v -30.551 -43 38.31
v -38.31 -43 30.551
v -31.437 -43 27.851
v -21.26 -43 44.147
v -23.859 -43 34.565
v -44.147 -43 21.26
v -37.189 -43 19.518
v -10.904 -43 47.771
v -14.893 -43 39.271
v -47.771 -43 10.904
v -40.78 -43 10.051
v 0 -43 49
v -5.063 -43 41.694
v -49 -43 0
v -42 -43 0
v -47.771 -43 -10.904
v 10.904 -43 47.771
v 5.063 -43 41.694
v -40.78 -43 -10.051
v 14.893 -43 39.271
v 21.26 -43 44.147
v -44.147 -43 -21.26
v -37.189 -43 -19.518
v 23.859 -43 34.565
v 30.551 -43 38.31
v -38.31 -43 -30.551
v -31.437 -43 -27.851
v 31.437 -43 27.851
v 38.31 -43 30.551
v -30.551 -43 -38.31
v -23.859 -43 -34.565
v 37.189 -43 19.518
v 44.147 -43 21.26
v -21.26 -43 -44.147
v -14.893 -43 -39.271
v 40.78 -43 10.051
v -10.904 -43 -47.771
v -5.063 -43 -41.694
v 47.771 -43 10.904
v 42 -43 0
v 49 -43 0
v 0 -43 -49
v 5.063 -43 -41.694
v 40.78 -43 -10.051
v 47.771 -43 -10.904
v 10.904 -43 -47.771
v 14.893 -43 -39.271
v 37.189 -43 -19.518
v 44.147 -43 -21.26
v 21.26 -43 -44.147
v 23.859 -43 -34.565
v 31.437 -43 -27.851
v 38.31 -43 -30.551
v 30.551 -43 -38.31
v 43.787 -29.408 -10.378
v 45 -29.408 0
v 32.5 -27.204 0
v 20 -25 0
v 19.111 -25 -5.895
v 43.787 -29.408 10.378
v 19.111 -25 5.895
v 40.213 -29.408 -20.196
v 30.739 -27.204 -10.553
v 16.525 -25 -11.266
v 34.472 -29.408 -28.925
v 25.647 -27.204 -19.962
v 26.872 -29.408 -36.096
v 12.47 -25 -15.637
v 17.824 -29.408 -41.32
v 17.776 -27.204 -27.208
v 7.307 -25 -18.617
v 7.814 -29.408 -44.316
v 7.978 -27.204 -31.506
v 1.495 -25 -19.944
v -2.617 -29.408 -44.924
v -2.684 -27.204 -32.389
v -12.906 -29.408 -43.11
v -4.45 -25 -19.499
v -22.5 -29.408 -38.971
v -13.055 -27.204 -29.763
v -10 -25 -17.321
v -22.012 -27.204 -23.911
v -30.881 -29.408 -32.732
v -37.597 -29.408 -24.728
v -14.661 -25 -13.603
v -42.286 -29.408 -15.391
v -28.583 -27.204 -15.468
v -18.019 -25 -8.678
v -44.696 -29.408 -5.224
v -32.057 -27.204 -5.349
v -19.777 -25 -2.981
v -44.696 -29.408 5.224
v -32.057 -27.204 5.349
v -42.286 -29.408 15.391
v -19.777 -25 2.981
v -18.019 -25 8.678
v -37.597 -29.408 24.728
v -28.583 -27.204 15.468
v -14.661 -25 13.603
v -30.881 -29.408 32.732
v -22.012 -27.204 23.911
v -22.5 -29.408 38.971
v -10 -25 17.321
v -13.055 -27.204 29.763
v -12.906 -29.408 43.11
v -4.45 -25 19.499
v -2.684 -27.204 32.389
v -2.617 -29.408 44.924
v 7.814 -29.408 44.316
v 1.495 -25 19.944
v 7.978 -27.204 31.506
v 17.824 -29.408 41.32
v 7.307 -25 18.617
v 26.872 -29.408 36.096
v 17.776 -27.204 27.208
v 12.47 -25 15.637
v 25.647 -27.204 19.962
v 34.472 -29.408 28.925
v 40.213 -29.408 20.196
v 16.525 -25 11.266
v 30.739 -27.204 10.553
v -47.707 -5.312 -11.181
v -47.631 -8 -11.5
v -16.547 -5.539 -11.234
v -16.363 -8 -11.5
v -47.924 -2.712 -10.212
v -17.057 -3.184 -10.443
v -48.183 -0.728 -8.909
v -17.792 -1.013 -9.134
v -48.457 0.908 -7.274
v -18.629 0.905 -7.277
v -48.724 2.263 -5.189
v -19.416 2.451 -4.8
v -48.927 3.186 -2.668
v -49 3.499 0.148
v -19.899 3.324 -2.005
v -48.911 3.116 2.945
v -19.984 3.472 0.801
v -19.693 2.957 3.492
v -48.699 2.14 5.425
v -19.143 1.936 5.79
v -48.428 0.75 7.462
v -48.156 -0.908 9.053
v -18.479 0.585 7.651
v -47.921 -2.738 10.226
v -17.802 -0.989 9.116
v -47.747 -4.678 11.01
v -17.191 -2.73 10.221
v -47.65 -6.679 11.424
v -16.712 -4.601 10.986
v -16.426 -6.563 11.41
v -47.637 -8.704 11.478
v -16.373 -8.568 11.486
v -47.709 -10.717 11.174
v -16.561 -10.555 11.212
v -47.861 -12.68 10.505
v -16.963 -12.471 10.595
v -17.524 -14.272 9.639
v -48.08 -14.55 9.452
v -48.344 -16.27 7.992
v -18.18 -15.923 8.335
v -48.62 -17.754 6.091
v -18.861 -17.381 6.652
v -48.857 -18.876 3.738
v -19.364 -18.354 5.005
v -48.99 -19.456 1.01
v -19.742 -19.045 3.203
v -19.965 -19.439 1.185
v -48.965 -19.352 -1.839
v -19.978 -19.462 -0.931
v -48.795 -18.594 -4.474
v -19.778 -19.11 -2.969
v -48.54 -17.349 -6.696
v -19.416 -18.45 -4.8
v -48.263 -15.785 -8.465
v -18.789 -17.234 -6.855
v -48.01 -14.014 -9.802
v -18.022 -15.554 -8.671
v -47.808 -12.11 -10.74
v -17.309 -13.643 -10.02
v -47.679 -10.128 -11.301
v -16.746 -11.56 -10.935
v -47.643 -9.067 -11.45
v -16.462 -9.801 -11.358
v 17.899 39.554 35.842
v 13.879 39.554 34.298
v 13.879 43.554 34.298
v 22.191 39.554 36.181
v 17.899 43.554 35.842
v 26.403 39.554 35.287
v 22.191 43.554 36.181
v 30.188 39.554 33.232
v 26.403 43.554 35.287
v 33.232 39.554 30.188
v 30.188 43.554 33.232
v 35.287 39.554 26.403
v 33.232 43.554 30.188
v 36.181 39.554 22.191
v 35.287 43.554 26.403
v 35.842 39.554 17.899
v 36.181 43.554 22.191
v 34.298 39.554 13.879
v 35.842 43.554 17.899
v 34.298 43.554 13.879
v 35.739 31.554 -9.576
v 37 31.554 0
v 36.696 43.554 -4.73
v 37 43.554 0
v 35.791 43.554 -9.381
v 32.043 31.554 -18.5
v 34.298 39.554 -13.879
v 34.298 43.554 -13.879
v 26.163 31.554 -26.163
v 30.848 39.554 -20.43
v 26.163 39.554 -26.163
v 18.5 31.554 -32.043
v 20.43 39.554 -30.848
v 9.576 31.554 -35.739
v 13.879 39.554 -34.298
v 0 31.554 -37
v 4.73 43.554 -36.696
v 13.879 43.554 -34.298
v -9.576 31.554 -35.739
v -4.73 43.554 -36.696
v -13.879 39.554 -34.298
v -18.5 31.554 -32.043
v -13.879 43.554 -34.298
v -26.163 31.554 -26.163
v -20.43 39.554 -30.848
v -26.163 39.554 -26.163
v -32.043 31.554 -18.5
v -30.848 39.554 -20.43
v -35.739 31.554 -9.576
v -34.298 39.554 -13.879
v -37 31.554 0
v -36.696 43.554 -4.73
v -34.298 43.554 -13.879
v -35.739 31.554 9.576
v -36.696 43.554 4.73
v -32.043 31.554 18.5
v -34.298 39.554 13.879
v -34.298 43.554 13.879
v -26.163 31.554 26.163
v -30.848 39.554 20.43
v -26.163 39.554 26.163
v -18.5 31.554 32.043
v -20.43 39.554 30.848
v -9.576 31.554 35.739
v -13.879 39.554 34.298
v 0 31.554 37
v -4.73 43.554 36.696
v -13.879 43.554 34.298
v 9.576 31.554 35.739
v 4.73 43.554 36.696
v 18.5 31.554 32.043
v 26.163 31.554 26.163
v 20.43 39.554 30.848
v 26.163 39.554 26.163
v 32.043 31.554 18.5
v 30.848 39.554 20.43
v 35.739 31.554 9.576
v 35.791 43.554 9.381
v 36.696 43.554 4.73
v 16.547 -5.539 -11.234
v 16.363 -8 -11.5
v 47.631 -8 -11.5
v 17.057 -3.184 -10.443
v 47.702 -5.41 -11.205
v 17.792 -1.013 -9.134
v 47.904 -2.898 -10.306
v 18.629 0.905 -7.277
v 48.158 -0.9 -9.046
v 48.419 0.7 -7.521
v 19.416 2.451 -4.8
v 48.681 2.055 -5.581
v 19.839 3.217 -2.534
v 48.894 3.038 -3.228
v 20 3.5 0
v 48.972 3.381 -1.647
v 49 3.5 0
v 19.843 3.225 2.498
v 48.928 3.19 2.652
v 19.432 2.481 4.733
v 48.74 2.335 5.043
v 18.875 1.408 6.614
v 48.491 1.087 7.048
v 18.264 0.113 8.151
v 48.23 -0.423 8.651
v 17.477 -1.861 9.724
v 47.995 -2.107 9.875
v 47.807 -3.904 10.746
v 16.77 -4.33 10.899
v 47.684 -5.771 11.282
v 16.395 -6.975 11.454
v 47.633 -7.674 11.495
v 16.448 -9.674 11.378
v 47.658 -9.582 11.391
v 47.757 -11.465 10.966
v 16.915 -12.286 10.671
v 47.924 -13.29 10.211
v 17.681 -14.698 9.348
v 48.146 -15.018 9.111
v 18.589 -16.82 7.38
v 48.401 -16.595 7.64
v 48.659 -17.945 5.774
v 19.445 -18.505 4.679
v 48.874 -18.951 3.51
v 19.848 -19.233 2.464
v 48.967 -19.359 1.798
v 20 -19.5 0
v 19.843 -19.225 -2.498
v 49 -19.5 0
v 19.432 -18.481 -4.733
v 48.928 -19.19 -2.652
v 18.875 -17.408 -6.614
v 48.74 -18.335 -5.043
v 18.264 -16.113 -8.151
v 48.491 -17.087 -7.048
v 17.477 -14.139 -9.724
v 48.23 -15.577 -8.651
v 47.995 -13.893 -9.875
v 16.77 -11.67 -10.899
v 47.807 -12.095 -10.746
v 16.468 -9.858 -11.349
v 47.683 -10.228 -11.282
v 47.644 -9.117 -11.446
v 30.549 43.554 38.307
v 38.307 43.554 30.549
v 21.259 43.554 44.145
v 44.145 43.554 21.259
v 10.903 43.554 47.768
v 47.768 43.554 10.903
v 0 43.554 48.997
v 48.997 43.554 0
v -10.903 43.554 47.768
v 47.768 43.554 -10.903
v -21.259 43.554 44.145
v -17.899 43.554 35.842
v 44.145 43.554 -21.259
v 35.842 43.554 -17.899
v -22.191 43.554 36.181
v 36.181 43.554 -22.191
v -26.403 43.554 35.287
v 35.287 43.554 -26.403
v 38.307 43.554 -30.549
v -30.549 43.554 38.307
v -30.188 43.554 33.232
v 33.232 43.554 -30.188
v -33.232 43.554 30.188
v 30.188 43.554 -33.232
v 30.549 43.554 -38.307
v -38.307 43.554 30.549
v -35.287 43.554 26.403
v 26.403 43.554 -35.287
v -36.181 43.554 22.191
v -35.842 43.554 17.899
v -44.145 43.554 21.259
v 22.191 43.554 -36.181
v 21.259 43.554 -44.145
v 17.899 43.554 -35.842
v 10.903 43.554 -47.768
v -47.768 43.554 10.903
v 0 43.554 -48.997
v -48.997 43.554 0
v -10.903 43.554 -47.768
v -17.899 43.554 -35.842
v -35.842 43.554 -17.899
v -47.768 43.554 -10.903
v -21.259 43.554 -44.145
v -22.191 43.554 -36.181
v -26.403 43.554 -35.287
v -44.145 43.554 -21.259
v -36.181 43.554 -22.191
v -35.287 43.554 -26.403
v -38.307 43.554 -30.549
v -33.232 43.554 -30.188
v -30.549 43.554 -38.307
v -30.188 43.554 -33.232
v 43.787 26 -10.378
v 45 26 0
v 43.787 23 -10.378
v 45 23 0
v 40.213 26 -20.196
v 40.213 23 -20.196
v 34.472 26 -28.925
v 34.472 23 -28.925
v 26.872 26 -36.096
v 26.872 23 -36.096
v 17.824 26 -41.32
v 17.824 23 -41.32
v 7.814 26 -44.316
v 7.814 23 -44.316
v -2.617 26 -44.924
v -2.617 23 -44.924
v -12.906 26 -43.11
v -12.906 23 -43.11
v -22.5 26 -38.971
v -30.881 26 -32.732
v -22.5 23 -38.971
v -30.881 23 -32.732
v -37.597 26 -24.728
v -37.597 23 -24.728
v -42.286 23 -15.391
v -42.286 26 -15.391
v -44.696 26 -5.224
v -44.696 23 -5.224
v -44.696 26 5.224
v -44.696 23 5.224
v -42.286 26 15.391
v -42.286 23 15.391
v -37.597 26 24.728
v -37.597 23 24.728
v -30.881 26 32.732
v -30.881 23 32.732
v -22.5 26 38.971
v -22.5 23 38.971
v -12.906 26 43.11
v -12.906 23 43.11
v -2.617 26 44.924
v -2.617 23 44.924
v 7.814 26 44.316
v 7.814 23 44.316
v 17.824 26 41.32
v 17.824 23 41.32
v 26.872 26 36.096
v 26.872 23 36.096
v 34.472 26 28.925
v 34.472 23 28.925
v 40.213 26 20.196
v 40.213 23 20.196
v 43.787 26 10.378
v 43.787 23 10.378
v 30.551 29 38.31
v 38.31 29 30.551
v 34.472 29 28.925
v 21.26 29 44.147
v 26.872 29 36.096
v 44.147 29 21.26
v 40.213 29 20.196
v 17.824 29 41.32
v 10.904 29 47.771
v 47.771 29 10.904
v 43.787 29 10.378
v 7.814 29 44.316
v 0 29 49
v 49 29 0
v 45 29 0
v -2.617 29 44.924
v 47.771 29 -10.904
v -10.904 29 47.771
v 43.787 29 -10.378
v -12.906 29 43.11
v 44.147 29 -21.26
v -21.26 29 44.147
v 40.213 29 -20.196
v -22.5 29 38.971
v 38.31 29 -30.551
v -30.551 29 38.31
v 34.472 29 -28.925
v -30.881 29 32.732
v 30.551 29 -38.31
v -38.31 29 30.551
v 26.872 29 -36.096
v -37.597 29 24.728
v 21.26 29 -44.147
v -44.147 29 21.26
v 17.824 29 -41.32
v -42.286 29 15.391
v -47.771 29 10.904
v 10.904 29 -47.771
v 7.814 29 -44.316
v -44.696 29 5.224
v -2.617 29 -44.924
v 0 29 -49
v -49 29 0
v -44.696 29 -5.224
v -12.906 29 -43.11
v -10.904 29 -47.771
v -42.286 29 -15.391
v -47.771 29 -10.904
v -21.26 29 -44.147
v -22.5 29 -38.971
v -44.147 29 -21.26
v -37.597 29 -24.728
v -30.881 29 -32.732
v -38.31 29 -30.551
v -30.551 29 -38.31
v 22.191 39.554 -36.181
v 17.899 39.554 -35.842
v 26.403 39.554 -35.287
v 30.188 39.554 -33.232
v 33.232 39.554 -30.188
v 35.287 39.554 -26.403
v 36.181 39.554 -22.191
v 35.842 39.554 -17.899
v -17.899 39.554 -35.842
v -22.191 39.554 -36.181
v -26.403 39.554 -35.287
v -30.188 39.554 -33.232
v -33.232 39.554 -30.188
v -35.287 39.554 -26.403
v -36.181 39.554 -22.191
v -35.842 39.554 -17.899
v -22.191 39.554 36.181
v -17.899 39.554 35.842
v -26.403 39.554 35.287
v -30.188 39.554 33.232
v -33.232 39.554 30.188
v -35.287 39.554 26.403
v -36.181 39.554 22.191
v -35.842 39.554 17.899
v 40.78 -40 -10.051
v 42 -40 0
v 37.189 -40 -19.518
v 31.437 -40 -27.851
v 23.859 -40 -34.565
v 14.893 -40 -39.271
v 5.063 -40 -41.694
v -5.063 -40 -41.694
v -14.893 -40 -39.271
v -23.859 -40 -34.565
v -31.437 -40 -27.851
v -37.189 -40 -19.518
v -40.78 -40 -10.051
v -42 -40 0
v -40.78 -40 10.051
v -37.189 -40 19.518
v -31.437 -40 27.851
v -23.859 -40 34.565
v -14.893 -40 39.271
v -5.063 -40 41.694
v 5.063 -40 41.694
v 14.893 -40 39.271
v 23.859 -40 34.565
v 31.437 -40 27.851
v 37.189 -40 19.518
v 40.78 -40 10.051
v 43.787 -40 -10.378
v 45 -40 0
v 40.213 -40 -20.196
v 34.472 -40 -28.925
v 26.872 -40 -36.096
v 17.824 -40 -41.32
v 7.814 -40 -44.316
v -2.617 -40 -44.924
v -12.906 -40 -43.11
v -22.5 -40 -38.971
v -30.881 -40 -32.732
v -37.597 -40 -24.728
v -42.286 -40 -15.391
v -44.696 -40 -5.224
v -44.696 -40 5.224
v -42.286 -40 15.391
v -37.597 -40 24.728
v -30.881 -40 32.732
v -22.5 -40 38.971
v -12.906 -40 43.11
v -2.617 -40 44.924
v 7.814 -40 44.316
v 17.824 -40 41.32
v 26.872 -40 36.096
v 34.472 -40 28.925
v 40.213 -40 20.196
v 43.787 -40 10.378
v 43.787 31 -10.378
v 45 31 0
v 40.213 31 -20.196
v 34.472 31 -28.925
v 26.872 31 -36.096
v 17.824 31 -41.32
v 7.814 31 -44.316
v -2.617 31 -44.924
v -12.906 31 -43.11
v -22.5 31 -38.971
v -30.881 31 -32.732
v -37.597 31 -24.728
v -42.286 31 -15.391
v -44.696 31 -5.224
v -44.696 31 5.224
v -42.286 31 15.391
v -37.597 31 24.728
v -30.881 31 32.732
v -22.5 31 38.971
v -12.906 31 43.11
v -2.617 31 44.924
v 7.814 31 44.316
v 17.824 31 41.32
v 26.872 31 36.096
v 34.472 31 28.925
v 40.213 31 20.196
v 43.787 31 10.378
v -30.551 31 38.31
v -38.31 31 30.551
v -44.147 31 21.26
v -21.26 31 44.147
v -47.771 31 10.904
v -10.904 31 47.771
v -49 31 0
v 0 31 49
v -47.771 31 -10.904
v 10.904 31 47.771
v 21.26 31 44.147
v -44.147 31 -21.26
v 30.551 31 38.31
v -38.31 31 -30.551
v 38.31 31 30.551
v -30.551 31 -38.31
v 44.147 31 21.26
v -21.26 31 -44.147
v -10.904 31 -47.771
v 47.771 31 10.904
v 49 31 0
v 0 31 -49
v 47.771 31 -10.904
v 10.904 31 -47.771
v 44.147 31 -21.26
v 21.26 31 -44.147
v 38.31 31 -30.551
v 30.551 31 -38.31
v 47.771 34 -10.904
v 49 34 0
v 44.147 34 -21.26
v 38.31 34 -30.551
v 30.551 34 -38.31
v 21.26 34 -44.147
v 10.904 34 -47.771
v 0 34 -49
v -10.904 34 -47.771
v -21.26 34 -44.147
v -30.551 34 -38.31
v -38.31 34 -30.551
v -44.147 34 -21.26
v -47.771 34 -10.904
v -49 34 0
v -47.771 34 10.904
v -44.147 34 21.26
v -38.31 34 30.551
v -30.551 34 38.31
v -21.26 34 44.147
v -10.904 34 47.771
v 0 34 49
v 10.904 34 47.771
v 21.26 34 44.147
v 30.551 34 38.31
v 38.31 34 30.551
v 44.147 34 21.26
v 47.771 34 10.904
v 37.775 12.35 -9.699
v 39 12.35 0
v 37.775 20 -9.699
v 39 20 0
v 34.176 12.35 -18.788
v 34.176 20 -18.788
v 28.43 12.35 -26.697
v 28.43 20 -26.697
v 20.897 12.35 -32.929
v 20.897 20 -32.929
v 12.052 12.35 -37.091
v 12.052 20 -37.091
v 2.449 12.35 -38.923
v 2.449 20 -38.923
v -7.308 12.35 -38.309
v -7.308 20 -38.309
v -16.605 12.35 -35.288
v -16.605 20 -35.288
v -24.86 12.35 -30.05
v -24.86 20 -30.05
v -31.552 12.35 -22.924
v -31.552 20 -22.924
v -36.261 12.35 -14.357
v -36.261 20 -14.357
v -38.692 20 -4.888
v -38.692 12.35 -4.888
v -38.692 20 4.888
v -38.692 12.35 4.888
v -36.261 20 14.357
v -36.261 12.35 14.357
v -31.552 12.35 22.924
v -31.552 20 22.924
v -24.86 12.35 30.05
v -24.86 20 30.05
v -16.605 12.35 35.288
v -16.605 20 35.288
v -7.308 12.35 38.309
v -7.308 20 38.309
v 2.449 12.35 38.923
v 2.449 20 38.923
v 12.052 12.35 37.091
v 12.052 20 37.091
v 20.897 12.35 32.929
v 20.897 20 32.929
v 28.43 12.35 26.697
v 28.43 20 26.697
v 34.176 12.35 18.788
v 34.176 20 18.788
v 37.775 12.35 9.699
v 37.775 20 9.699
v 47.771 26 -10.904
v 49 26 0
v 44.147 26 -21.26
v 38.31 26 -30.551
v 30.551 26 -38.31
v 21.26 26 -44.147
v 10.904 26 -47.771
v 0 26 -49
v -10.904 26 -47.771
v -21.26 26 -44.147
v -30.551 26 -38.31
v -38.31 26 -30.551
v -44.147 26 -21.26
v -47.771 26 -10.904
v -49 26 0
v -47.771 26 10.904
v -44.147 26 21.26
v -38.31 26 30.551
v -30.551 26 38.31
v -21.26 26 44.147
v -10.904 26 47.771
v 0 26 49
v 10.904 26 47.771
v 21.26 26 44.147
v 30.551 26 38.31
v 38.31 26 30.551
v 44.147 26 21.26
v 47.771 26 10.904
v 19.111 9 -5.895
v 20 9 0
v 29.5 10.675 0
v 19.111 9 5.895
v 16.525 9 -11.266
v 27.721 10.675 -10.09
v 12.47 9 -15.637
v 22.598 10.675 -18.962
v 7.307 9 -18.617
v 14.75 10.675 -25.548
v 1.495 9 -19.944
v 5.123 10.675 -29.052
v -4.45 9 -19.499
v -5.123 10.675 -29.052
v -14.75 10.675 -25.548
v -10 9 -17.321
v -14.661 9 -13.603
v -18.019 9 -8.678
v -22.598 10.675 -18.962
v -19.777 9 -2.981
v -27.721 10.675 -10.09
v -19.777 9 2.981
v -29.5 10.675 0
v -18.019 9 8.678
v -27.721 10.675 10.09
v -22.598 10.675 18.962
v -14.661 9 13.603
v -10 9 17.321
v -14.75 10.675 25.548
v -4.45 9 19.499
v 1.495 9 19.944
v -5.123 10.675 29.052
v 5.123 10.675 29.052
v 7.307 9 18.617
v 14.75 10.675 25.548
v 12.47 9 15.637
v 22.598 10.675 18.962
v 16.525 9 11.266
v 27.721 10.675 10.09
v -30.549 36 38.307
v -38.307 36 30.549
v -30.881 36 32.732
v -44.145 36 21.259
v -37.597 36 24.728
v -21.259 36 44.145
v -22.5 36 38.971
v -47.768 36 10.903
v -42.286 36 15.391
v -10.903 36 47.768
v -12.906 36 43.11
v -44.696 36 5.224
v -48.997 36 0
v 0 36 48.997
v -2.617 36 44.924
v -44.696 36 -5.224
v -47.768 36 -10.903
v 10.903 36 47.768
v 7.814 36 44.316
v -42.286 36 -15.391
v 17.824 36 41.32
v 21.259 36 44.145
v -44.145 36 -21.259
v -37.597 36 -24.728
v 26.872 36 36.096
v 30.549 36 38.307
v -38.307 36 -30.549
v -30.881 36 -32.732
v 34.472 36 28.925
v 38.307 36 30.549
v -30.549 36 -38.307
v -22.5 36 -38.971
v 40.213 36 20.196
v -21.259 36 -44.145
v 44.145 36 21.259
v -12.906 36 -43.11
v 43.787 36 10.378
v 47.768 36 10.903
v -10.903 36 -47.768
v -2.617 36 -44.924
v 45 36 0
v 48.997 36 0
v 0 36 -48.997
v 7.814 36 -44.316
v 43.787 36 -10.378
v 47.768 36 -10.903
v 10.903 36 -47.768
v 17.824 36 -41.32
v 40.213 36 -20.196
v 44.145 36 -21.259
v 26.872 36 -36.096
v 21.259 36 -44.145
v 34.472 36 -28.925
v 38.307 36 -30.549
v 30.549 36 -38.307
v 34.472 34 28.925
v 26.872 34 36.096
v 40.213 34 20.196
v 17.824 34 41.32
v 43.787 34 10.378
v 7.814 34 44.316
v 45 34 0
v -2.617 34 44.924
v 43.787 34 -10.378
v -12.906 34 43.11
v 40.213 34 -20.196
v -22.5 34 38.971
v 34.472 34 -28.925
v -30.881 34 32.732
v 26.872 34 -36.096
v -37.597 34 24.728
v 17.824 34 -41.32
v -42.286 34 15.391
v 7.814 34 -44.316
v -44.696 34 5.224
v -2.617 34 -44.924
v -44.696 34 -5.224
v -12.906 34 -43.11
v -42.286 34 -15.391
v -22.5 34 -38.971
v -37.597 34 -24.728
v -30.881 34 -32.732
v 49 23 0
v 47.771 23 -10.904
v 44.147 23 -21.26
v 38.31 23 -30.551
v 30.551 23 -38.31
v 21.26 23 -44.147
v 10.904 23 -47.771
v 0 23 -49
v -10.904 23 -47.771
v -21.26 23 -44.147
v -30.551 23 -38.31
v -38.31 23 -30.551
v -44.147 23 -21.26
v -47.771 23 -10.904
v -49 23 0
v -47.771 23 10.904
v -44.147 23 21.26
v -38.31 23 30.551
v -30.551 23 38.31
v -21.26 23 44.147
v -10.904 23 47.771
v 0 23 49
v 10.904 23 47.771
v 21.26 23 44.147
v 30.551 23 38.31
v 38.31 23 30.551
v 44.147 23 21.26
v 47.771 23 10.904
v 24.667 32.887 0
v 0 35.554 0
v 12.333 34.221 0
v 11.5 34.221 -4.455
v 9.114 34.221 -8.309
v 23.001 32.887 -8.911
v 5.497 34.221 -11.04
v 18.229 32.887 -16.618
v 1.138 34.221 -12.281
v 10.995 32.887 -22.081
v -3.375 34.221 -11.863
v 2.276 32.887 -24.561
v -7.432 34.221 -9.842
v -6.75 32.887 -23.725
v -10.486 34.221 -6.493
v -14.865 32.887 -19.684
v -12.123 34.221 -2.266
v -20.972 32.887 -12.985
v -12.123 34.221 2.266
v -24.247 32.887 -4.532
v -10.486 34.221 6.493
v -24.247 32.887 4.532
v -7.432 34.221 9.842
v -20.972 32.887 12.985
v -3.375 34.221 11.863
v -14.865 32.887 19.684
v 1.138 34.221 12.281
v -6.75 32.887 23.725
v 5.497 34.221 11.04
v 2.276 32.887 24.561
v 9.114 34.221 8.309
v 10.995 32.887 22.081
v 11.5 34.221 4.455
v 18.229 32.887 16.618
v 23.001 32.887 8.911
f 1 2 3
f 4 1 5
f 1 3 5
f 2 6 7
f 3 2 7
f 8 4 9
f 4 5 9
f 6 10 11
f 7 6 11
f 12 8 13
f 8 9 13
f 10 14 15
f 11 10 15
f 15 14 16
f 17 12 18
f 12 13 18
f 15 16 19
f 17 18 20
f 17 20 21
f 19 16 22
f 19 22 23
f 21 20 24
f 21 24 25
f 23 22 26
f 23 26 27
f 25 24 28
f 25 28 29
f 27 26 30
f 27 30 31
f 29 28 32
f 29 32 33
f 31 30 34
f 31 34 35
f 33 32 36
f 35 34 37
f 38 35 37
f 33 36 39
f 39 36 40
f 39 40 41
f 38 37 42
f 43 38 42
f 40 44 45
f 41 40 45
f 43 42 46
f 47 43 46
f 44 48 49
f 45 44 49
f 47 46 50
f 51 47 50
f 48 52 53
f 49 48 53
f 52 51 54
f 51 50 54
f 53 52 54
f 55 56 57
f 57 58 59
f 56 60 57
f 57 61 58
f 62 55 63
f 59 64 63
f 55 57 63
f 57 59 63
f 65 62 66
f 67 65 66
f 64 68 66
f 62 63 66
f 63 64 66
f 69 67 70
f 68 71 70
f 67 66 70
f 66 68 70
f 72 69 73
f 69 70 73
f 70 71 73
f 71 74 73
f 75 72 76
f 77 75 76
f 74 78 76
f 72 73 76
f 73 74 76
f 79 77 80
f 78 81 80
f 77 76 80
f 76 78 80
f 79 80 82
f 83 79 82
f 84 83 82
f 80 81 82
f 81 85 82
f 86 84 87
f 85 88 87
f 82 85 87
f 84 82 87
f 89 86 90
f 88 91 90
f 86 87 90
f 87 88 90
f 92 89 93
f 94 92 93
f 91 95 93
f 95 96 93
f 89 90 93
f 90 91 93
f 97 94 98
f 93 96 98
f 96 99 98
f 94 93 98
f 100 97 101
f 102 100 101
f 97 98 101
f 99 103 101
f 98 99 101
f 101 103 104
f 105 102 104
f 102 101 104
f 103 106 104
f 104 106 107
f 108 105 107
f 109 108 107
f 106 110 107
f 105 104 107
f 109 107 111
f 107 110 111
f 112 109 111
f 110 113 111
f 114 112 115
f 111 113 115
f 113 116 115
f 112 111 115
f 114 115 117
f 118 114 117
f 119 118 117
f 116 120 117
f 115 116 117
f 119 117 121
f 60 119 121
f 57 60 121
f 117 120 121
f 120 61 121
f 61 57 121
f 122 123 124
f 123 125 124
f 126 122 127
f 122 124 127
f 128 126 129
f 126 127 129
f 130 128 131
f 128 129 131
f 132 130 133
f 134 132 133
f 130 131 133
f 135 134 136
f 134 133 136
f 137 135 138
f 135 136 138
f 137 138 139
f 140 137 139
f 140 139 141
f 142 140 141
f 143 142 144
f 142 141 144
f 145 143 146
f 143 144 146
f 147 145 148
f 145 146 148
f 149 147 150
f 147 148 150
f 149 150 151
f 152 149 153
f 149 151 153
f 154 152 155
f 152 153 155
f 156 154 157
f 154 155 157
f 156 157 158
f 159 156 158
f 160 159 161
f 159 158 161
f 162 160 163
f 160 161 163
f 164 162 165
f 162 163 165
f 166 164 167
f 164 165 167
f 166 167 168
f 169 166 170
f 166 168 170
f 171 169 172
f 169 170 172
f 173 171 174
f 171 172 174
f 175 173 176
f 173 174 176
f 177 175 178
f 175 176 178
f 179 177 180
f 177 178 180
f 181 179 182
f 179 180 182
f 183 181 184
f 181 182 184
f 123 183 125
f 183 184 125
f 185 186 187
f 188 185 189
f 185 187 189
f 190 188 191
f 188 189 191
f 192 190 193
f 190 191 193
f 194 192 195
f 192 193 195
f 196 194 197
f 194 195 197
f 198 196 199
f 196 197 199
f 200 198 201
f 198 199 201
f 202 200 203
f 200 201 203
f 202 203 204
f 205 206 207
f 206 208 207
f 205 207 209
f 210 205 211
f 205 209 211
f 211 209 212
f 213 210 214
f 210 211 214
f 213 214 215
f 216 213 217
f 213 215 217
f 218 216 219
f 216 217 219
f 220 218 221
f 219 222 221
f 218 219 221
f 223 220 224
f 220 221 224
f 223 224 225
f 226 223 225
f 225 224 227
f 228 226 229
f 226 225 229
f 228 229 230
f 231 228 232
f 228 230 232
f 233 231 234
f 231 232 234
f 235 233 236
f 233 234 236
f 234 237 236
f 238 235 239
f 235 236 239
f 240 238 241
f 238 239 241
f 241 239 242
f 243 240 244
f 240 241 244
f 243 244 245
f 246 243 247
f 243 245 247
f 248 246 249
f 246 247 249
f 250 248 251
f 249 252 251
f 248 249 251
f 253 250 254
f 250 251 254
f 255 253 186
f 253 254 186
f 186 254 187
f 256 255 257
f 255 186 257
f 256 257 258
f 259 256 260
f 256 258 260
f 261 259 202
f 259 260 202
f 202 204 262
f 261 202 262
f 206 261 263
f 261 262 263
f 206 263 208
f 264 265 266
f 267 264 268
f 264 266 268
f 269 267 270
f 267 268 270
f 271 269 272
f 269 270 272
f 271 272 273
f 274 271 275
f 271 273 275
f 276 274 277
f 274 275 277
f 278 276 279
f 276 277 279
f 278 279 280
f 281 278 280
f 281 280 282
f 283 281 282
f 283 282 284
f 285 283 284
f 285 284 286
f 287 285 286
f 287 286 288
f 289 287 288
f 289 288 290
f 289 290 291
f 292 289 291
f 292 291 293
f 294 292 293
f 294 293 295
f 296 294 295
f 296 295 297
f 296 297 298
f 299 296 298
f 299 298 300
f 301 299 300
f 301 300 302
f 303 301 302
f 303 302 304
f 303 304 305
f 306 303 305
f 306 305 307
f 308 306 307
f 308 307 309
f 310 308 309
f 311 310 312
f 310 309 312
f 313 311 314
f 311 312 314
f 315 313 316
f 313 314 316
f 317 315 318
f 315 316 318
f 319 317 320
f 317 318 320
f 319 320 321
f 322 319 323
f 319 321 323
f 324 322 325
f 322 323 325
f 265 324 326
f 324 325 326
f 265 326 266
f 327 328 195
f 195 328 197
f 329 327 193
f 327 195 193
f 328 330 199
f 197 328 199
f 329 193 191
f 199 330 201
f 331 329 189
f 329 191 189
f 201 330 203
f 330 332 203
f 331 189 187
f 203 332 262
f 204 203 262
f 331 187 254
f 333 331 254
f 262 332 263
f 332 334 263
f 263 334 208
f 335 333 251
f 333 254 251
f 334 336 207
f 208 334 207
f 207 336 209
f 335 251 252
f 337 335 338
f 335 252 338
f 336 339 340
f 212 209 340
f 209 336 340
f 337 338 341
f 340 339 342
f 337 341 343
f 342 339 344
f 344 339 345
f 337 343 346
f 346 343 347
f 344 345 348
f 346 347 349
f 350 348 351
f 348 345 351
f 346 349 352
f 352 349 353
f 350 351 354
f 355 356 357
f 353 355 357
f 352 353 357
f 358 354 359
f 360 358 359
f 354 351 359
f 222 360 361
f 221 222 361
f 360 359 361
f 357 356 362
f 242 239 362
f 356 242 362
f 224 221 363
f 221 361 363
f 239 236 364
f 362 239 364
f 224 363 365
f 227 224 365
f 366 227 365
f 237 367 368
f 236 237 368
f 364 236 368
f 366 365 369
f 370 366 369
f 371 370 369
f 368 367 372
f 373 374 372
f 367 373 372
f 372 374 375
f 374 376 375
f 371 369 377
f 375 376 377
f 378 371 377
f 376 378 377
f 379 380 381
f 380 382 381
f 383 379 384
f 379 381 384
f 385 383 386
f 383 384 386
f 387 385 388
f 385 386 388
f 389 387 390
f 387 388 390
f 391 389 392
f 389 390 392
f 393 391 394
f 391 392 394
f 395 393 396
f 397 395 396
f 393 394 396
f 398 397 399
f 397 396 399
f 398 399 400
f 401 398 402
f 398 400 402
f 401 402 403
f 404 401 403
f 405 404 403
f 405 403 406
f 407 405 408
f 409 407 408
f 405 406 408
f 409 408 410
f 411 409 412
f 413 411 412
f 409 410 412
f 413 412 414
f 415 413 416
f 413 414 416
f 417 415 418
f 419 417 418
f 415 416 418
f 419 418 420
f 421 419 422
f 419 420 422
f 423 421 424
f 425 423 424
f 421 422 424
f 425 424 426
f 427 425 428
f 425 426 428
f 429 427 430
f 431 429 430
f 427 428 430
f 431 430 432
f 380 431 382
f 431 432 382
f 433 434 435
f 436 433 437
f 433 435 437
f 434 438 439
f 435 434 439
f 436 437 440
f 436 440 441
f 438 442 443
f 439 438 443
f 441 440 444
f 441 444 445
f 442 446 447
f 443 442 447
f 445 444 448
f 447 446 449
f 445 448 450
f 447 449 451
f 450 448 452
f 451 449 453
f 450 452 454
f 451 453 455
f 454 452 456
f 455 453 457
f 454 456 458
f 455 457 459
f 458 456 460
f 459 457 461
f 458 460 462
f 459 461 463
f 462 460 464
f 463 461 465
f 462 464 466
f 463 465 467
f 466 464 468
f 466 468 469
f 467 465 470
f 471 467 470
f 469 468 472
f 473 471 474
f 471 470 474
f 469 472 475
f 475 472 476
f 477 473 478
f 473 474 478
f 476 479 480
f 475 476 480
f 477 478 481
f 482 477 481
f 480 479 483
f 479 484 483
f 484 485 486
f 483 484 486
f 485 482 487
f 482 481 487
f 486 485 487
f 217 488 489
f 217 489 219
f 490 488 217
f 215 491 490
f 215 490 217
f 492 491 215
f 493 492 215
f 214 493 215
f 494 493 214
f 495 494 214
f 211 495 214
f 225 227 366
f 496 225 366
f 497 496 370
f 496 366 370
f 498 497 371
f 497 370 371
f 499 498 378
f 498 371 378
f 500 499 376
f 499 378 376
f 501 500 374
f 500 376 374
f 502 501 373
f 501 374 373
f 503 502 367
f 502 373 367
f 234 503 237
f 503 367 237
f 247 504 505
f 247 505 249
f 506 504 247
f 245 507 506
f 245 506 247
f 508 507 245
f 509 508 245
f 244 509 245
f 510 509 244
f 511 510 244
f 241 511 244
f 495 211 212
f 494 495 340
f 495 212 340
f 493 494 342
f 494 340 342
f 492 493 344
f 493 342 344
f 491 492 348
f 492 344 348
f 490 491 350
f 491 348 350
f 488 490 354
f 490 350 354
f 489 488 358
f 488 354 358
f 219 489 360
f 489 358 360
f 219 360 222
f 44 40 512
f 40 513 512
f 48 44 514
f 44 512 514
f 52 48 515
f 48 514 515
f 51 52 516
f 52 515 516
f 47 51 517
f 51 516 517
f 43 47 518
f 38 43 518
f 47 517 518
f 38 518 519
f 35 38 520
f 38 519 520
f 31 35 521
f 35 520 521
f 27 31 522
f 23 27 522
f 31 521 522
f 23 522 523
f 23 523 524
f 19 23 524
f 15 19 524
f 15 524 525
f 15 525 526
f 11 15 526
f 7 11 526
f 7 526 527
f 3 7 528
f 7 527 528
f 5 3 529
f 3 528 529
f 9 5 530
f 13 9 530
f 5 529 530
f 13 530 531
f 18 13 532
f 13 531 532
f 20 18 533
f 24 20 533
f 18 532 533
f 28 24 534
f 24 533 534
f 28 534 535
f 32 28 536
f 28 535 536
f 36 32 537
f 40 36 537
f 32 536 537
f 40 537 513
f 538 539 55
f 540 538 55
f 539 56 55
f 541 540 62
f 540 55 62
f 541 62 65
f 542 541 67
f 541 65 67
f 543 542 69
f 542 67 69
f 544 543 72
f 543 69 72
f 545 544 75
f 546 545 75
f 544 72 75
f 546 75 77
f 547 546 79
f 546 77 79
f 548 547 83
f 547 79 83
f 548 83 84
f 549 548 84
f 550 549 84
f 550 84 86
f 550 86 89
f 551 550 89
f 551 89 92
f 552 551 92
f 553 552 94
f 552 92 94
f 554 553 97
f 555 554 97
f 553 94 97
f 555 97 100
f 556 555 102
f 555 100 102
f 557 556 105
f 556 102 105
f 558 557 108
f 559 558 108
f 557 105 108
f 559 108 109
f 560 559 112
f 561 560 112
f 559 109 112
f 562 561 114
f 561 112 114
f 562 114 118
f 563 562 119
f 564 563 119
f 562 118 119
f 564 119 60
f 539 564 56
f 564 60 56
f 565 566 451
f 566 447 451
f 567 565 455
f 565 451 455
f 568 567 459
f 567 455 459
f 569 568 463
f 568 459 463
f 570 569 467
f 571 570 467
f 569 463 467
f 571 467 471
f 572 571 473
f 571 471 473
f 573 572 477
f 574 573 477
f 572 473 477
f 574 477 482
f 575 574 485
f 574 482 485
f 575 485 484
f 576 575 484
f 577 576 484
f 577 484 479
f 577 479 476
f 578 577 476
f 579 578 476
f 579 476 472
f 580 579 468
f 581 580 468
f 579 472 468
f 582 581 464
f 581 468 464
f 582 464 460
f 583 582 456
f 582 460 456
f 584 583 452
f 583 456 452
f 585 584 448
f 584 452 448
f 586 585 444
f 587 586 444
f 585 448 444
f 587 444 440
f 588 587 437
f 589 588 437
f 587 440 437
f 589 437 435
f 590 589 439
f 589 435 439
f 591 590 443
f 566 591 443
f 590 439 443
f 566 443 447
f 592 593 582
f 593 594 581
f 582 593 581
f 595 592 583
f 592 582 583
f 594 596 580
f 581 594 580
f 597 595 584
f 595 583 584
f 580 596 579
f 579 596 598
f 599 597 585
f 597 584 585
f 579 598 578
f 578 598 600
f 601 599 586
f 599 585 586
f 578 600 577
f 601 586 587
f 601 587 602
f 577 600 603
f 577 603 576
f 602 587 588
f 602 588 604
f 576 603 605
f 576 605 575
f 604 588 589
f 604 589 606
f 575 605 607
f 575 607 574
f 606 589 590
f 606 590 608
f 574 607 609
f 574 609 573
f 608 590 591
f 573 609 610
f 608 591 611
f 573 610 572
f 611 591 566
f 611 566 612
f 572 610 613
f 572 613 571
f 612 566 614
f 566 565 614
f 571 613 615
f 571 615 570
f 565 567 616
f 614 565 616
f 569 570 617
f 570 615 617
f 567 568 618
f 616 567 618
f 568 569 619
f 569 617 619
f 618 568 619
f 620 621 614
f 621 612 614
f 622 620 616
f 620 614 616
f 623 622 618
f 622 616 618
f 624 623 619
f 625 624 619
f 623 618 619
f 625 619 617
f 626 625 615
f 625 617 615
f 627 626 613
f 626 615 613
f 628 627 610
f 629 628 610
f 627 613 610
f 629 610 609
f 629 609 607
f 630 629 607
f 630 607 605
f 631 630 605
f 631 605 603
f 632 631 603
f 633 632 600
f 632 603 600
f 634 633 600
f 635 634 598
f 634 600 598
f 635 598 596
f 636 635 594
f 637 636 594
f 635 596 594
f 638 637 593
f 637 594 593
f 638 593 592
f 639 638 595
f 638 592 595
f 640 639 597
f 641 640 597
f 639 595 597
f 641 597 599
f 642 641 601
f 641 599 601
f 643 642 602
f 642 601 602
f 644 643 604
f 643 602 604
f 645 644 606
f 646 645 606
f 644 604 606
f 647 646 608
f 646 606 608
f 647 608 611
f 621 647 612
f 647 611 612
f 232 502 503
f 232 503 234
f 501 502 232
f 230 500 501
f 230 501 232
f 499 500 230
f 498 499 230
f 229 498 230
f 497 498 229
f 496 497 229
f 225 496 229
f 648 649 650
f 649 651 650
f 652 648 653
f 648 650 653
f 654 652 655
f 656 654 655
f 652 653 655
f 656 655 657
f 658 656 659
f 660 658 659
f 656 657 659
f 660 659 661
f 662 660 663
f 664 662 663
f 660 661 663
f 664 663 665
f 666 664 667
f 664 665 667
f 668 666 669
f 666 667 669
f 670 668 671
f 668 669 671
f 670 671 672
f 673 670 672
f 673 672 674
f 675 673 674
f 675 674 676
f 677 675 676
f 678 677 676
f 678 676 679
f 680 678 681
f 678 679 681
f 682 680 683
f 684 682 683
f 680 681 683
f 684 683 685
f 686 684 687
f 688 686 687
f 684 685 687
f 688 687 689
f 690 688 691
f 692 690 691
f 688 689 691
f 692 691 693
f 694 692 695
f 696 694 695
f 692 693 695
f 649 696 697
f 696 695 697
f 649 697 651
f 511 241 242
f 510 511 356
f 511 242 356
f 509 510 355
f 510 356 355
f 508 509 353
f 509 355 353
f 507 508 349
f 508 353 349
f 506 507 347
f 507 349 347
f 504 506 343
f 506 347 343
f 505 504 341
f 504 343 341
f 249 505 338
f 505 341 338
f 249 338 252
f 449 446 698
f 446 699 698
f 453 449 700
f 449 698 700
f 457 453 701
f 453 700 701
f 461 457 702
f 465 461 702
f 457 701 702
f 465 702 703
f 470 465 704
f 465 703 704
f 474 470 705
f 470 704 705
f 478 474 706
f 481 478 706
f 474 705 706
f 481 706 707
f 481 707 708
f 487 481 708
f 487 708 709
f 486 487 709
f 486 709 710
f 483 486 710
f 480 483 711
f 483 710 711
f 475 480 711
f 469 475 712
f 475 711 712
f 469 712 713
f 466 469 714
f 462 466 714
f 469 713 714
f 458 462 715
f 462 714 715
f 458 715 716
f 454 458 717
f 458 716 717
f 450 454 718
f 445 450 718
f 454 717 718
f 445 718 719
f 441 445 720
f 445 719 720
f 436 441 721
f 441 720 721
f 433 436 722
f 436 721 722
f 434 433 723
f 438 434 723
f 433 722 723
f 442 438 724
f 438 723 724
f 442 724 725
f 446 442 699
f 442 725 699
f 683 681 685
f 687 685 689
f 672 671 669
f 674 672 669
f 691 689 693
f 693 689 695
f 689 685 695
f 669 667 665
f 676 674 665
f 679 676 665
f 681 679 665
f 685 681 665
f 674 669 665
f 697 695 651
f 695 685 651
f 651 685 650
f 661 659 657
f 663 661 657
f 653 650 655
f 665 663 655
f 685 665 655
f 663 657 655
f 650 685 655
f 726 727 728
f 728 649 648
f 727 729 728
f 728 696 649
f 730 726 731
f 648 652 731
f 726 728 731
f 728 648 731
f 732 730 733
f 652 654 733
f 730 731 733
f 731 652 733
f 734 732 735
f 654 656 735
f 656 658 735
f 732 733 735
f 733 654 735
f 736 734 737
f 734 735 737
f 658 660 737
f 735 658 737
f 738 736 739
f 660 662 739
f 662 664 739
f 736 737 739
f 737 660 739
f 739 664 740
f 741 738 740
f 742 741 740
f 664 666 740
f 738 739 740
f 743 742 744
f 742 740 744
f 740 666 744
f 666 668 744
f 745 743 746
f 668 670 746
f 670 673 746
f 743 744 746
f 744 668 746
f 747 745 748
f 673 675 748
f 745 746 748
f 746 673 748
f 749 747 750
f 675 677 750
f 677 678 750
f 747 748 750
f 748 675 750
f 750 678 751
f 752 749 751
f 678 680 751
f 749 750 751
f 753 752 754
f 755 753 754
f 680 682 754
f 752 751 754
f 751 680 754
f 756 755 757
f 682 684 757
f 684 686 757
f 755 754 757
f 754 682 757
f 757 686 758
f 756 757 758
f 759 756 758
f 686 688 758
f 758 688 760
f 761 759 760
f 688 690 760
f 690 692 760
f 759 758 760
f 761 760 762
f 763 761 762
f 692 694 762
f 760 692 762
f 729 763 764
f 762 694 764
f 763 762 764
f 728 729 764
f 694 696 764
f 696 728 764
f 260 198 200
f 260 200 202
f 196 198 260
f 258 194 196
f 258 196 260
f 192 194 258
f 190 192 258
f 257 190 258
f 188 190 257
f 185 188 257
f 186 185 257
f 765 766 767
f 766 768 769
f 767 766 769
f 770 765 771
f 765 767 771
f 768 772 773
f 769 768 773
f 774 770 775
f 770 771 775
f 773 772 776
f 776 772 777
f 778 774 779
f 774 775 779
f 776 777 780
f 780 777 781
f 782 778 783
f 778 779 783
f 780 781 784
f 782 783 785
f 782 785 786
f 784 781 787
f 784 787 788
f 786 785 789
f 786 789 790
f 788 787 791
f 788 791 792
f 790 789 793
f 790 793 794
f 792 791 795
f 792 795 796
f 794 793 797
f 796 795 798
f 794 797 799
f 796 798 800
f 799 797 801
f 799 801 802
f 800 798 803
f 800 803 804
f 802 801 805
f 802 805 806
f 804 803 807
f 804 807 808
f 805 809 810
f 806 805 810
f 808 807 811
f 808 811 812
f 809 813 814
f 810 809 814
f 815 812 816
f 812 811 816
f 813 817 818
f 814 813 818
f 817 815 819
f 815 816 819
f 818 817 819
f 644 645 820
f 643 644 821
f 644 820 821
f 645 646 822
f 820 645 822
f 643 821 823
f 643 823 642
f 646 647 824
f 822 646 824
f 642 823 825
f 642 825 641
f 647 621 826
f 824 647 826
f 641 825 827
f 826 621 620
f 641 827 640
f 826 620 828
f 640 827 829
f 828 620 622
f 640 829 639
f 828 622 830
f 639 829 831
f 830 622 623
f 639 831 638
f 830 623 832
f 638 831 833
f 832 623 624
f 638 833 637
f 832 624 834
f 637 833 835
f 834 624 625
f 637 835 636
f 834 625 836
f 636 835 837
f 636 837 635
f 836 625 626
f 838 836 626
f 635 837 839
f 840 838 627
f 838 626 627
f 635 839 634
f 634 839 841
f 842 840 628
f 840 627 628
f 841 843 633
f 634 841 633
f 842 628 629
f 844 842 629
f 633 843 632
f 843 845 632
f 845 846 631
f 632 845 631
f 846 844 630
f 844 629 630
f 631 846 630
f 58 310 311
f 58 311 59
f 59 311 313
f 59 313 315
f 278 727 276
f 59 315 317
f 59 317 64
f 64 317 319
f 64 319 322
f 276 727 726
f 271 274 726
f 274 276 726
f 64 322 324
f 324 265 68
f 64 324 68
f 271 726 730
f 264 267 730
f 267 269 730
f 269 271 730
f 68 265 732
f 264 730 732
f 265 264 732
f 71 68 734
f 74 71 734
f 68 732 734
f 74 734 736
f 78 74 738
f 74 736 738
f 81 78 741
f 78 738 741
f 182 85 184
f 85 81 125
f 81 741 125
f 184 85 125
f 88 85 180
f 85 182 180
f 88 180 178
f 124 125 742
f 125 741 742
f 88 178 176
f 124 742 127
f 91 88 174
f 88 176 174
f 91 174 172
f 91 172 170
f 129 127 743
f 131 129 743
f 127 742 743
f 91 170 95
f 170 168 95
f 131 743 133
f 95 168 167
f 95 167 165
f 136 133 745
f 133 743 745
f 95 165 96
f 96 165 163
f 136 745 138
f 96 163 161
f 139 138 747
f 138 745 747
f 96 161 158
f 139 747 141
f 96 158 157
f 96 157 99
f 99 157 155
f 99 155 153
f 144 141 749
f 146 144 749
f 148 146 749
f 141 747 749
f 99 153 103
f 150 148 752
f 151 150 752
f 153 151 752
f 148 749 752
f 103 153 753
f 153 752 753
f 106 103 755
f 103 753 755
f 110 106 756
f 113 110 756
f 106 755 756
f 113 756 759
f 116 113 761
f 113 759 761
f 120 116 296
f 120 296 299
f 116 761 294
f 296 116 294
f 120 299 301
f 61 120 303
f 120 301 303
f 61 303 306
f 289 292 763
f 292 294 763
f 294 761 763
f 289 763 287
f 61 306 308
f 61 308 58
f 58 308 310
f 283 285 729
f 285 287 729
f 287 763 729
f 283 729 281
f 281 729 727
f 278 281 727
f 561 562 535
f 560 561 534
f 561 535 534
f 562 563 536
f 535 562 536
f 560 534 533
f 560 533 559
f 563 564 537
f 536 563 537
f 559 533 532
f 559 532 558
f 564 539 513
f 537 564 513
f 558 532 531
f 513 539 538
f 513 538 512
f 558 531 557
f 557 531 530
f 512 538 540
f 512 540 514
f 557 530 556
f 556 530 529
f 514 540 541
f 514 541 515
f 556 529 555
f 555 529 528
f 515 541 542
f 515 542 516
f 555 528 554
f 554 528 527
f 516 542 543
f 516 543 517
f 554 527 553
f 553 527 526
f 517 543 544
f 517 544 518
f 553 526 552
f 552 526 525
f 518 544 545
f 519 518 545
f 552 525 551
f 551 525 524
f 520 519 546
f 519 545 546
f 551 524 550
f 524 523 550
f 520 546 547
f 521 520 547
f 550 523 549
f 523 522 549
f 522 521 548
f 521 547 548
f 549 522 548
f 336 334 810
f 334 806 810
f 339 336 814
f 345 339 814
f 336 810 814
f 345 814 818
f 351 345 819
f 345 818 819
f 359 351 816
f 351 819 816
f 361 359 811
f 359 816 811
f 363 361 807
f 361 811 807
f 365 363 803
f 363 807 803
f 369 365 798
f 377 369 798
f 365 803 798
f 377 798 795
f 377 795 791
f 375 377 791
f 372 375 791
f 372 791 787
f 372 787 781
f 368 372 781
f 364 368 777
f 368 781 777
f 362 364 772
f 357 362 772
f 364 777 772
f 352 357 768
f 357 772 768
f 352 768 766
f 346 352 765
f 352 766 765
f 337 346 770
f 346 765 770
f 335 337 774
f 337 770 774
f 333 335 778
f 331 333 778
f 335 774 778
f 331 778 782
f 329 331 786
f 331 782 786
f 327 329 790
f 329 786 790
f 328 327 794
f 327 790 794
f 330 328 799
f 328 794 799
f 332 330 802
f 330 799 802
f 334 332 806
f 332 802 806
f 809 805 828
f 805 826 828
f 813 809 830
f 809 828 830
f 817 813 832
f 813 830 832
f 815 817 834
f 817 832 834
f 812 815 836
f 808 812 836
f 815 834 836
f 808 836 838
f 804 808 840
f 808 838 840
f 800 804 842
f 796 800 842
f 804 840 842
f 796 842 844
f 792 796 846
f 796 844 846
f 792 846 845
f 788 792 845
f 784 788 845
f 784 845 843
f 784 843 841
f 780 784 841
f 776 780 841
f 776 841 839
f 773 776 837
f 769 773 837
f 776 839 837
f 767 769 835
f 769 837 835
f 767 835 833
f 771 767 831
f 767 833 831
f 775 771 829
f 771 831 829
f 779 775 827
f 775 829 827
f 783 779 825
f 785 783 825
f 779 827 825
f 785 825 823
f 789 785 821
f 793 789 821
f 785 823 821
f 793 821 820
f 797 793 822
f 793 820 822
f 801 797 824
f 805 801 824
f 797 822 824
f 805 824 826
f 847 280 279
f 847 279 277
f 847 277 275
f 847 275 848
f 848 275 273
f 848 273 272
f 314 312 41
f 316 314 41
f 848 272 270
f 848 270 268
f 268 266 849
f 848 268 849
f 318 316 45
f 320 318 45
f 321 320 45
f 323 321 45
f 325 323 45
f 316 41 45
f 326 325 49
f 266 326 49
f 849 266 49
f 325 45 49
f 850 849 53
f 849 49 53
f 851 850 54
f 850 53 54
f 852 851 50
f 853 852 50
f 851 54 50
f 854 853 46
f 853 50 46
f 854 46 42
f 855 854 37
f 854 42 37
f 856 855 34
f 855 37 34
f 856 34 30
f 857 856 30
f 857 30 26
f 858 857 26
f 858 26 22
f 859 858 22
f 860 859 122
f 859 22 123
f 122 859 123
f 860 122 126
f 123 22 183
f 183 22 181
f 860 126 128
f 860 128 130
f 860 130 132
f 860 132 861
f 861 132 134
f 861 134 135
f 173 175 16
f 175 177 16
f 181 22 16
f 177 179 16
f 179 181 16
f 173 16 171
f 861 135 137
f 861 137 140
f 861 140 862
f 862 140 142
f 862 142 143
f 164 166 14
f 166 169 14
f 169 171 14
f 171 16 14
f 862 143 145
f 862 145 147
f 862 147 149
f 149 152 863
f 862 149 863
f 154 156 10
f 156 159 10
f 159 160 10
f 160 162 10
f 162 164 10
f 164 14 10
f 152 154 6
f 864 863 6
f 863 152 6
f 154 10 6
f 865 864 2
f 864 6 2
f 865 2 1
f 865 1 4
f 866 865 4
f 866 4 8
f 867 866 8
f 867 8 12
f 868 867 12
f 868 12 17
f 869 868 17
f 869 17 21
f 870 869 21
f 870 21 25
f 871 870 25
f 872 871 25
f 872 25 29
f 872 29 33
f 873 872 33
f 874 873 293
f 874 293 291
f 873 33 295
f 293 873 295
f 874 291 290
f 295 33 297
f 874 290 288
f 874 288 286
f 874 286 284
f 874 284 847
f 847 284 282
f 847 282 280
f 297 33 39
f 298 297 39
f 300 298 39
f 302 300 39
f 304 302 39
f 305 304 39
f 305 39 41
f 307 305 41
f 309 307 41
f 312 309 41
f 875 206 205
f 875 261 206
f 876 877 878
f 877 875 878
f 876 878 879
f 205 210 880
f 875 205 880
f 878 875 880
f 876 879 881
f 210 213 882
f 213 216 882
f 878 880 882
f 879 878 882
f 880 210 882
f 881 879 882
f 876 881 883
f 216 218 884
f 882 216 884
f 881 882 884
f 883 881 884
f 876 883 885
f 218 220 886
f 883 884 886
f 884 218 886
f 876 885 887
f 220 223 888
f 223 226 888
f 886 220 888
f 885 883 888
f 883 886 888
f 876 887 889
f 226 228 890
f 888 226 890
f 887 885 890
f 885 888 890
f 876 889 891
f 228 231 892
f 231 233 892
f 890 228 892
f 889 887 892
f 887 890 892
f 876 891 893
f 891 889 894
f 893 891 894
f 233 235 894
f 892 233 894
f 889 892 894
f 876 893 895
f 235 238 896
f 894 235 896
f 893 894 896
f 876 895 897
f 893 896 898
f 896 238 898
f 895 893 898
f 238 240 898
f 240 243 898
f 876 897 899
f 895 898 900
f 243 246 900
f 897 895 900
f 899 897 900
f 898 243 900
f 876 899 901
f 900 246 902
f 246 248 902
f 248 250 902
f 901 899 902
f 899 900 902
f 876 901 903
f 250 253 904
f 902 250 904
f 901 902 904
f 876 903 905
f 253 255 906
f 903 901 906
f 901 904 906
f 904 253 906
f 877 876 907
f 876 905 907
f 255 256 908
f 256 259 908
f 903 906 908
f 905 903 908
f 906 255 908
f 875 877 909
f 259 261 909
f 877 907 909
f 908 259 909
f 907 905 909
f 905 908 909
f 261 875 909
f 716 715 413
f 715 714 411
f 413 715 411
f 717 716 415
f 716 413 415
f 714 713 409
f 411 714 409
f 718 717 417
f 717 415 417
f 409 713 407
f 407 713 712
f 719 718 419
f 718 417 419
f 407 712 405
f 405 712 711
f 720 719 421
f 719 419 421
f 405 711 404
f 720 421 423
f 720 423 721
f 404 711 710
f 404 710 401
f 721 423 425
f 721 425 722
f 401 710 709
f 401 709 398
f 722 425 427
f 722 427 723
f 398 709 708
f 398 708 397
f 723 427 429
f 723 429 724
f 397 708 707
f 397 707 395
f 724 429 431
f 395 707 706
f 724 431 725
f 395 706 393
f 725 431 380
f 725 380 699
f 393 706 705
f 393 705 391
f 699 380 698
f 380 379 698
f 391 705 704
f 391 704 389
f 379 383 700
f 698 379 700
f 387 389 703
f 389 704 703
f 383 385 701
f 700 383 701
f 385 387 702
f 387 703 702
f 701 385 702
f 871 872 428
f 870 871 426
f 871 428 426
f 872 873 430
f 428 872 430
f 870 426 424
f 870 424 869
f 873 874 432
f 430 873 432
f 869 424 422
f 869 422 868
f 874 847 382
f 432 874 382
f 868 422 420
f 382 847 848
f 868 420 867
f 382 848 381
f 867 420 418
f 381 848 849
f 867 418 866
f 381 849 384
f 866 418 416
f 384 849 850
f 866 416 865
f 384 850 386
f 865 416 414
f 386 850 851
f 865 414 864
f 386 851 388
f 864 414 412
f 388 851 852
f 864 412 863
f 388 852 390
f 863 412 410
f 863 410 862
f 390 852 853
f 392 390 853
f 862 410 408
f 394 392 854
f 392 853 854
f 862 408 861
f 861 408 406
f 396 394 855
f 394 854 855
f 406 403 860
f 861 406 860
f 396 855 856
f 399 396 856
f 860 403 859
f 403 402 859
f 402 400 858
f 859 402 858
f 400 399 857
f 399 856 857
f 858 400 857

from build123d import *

# Parameters (mm, degrees)
SKETCH10_R         = 11.5
CUT_EXTRUDE1_DEPTH = 70
SKETCH12_R         = 15
CUT_EXTRUDE2_DEPTH = 4
CIRPATTERN1_COUNT  = 4


with BuildPart() as part:
    # Sketch1 → Revolve1 (revolve)
    with BuildSketch(Plane.XY):
        Polygon((37, 43.55415604), (48.996866339, 43.55415604), (48.996866339, 36), (45, 36), (45, 34), (49, 34), (49, 31), (45, 31), (45, 29), (49, 29), (49, 26), (45, 26), (45, 23), (49, 23), (49, -43), (42, -43), (42, -40), (45, -40), (45, -29.408174518), (20, -25), (20, 9), (39, 12.350212633), (39, 20), (0, 20), (0, 35.55415604), (37, 31.55415604), align=None)
    revolve(axis=Axis((0, 43, 0), (0, 1, 0)))

    # Sketch10 → Cut-Extrude1 (cut, symmetric)
    with BuildSketch(Plane(origin=(0, 0, 0), x_dir=(0, 0, -1), z_dir=(1, 0, 0))):
        with Locations((0, -8)):
            Circle(SKETCH10_R)
    extrude(amount=CUT_EXTRUDE1_DEPTH, both=True, mode=Mode.SUBTRACT)

    # Sketch12 → Cut-Extrude2 (cut)
    with BuildSketch(Plane(origin=(0, 43.55415604, 0), x_dir=(1, 0, 0), z_dir=(0, 1, 0))):
        with Locations((-21.213203436, 21.213203436)):
            Circle(SKETCH12_R)
    cut_extrude2 = extrude(amount=-CUT_EXTRUDE2_DEPTH, mode=Mode.SUBTRACT)

    # CirPattern1: Cut-Extrude2 ×4 about axis
    cirpattern1_axis = Axis((0, 0, 0), (0, 1, 0))
    for i in range(1, CIRPATTERN1_COUNT):
        add(cut_extrude2.rotate(cirpattern1_axis, i * 360 / CIRPATTERN1_COUNT), mode=Mode.SUBTRACT)


solid = part.part
